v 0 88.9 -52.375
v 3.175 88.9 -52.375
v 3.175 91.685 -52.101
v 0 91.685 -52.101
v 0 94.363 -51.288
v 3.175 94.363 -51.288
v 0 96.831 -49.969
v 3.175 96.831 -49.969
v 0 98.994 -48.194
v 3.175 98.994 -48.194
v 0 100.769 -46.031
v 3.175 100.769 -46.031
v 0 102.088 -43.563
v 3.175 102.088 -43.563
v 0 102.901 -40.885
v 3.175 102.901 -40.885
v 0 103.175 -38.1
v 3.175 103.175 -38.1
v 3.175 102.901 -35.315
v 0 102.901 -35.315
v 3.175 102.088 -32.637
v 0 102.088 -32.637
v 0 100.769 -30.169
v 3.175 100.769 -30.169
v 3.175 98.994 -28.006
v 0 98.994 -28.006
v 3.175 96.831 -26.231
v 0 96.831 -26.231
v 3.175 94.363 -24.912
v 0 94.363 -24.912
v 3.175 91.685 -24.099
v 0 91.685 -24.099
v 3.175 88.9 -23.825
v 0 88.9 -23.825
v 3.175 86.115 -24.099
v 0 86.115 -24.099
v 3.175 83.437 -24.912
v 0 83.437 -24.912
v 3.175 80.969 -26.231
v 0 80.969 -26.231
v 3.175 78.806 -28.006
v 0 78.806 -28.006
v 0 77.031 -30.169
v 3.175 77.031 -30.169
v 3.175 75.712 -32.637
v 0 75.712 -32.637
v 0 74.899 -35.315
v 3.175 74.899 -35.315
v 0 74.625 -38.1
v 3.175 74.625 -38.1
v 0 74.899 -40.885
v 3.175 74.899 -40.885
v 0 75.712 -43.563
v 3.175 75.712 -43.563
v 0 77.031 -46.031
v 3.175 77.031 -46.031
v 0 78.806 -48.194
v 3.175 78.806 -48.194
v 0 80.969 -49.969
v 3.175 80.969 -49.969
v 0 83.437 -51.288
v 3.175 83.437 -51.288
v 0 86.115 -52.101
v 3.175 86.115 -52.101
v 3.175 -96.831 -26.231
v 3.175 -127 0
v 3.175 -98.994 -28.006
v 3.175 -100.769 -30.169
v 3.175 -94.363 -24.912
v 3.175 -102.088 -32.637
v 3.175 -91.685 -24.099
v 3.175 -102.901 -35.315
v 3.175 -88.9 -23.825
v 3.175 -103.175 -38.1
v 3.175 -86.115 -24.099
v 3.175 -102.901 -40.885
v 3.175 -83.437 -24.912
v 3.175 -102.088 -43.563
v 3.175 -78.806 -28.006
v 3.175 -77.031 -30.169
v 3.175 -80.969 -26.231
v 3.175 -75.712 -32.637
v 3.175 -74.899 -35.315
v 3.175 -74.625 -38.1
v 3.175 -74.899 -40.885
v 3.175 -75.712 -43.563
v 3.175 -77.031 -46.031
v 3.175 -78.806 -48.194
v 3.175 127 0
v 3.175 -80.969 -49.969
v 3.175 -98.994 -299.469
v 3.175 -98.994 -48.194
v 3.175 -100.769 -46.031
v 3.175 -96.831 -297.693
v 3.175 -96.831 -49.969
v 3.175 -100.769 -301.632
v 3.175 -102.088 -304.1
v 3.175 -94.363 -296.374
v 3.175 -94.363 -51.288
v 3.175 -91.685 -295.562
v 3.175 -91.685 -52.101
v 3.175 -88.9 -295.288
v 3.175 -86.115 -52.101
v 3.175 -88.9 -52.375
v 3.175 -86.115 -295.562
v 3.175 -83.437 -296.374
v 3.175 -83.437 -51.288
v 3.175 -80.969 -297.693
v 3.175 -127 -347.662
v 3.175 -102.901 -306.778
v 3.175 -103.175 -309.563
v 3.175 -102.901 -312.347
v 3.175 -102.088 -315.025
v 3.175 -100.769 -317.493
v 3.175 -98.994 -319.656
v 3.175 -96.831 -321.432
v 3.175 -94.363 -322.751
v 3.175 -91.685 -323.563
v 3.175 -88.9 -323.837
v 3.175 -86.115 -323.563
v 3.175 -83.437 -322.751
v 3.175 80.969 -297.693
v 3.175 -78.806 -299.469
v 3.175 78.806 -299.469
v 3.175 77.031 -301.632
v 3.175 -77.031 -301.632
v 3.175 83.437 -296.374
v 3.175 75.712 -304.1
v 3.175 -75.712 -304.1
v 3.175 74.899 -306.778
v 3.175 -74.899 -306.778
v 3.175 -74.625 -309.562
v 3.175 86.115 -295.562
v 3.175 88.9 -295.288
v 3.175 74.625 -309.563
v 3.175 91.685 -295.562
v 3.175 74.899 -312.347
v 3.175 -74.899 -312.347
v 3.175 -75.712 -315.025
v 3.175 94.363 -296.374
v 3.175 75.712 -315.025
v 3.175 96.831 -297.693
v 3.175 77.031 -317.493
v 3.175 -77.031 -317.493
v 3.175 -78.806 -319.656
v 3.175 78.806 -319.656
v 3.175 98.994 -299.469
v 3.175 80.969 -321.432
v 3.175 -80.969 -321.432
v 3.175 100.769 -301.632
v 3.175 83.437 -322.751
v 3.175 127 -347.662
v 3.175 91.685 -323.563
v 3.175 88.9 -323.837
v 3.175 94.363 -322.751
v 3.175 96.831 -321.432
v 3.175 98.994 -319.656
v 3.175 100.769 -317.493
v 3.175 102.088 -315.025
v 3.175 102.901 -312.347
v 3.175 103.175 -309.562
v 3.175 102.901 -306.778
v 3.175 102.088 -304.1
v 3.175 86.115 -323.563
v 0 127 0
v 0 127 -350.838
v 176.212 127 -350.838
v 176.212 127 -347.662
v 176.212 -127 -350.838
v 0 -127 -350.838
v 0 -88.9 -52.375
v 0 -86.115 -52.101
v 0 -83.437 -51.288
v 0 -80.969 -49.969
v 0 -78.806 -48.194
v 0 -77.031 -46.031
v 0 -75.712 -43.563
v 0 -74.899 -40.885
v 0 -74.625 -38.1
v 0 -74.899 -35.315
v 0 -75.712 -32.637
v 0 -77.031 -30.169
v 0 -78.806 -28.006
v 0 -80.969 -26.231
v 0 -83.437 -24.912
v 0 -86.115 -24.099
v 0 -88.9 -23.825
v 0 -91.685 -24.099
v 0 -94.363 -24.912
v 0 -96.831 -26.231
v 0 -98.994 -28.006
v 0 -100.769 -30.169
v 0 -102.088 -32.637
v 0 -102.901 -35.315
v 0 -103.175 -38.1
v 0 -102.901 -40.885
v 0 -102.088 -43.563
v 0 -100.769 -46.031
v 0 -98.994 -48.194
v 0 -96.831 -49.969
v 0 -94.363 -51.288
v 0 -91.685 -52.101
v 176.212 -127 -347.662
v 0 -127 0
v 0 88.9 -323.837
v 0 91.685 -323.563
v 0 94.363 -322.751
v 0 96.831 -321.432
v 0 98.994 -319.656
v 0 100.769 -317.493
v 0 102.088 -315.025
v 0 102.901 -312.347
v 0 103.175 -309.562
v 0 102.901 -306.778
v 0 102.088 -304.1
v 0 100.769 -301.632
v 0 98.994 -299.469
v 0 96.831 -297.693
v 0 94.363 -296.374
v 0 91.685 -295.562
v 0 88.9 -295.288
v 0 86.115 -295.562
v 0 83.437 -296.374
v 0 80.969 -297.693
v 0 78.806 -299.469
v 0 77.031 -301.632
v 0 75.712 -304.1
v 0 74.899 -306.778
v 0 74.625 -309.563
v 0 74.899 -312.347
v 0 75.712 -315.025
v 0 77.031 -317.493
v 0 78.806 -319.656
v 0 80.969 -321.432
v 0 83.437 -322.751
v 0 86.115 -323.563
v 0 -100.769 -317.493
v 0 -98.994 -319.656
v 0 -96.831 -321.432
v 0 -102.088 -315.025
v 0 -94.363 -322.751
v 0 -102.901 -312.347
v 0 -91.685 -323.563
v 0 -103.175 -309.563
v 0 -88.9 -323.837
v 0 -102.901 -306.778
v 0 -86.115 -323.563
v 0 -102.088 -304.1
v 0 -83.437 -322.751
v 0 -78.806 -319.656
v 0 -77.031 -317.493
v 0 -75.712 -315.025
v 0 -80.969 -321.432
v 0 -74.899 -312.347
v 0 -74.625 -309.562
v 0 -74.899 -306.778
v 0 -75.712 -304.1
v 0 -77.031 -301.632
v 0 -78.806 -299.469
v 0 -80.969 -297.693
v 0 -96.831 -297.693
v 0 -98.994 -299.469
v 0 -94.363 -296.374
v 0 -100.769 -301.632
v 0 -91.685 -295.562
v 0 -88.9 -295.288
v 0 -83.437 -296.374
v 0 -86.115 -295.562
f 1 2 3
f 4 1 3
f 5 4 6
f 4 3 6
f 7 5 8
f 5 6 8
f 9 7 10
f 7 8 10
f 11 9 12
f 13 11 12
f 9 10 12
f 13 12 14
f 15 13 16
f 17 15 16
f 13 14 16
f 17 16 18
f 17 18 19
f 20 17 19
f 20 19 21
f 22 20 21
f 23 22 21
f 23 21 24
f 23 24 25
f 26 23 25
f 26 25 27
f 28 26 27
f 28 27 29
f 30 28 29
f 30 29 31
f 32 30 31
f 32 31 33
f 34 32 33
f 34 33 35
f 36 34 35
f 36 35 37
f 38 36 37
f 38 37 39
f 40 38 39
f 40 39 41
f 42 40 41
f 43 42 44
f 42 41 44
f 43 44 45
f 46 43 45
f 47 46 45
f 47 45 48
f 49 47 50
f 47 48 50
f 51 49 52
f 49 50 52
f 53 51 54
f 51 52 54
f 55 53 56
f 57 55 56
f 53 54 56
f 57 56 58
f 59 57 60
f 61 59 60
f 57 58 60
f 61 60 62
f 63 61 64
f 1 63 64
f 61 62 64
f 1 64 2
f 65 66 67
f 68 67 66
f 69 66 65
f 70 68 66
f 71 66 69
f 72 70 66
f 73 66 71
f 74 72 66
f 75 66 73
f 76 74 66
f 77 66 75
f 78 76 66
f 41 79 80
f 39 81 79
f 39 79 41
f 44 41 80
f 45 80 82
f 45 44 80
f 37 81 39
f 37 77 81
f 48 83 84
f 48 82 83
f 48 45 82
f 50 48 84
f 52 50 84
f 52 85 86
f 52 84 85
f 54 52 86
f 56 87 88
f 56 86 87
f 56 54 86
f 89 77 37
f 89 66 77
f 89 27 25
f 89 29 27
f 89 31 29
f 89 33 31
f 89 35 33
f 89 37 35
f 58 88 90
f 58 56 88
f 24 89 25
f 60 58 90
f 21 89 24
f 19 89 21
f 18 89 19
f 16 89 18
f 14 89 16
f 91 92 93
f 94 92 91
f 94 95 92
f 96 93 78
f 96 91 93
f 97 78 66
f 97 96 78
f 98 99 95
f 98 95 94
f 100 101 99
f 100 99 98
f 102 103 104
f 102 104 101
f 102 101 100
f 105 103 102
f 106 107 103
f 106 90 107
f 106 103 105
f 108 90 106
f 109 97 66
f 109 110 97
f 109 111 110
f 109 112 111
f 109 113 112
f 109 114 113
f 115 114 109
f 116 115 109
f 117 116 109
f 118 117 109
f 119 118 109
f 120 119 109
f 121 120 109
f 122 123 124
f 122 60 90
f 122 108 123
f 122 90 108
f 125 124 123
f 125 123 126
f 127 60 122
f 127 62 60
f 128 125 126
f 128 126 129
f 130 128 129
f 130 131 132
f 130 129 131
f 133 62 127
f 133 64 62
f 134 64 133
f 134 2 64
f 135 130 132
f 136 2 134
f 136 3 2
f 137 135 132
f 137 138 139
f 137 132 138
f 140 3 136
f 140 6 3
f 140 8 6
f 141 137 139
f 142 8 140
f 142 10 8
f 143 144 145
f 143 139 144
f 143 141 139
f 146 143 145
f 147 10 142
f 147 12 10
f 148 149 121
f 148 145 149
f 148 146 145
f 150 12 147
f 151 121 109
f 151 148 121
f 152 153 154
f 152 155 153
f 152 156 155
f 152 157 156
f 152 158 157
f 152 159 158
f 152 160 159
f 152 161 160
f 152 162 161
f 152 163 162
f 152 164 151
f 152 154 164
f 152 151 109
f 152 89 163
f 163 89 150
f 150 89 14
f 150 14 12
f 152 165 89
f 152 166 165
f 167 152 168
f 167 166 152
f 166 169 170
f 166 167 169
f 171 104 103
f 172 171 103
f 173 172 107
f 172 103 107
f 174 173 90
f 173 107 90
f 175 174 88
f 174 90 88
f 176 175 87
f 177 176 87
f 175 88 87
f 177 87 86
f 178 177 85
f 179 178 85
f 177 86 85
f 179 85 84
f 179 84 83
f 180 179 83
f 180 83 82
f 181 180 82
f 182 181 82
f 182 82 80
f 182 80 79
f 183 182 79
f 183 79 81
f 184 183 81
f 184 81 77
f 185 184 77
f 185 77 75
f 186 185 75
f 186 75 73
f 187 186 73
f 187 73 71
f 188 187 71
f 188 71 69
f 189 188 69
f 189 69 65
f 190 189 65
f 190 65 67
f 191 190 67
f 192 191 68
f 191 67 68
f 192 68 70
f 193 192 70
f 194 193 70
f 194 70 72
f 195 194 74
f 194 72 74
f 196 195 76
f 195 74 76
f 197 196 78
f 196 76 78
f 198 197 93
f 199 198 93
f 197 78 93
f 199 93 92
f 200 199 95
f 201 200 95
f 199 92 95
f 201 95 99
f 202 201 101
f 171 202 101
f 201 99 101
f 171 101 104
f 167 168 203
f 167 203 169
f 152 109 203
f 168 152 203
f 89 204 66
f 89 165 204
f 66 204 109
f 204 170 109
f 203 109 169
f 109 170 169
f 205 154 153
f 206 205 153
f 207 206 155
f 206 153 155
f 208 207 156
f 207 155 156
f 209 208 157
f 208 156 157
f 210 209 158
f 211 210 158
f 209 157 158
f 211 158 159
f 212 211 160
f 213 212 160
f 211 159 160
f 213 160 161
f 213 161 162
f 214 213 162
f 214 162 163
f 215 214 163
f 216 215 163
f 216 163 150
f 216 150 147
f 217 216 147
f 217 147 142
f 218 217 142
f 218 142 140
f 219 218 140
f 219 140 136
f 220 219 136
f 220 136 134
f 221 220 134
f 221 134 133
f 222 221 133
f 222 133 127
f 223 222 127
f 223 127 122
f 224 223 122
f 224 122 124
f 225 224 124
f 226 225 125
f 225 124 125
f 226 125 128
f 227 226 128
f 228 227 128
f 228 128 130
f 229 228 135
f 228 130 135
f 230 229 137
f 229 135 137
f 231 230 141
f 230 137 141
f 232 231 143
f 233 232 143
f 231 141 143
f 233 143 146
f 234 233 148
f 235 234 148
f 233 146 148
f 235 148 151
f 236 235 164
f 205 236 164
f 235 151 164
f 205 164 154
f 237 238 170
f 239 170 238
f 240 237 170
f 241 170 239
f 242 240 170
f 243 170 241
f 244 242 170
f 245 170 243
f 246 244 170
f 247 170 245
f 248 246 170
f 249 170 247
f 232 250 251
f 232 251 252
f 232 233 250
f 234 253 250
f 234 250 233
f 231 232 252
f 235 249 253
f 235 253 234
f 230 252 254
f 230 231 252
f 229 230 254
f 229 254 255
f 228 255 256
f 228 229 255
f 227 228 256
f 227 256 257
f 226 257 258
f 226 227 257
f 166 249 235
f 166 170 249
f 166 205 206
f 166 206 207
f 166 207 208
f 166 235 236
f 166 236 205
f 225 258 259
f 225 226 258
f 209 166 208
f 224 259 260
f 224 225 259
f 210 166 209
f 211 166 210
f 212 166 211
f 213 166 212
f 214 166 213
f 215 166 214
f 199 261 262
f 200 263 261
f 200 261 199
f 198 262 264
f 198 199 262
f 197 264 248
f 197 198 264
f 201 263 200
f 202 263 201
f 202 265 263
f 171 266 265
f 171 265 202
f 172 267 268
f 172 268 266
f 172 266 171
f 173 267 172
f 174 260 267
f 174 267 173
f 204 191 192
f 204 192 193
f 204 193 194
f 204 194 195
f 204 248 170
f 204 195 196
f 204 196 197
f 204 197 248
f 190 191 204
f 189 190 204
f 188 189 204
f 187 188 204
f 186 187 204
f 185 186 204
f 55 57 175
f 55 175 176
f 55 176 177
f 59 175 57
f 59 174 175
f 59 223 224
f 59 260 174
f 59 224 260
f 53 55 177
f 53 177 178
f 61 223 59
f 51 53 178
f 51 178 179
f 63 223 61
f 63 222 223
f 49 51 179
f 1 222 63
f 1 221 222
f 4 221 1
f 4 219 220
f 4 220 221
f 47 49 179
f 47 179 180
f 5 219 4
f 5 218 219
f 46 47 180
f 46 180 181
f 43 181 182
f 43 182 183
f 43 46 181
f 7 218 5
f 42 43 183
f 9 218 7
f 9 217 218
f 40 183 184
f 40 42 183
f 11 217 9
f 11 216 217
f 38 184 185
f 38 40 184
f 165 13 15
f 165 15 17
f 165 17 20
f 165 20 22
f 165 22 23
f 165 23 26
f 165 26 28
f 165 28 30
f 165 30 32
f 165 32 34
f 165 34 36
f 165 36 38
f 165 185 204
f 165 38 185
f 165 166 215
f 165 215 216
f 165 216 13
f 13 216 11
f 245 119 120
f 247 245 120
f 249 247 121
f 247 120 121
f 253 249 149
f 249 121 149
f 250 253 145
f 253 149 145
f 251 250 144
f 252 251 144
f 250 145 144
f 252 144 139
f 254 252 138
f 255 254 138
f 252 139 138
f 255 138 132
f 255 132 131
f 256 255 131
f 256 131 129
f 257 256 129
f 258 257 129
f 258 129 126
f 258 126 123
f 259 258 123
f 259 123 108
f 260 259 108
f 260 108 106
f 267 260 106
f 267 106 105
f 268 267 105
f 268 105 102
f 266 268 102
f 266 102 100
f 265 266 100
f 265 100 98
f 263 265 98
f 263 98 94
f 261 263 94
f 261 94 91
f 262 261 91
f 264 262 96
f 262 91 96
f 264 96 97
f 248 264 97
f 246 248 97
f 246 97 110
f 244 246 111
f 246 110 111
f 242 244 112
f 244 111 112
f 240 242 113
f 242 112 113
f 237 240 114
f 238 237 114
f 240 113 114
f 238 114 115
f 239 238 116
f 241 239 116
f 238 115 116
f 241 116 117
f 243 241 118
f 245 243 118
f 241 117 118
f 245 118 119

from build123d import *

# Parameters (mm, degrees)
BOSS_EXTRUDE1_DEPTH = 127
SKETCH2_R           = 14.2748
CUT_EXTRUDE1_DEPTH  = 4.175


with BuildPart() as part:
    # Sketch1 → Boss-Extrude1 (new body, symmetric)
    with BuildSketch(Plane(origin=(0, 0, 0), x_dir=(1, 0, 0), z_dir=(0, 1, 0))):
        Polygon((0, 0), (3.175, 0), (3.175, 347.6625), (176.2125, 347.6625), (176.2125, 350.8375), (0, 350.8375), align=None)
    extrude(amount=BOSS_EXTRUDE1_DEPTH, both=True)

    # Sketch2 → Cut-Extrude1 (cut, through all)
    with BuildSketch(Plane(origin=(3.175, 0, 0), x_dir=(0, 0, -1), z_dir=(1, 0, 0))):
        with Locations((309.5625, -88.9)):
            Circle(SKETCH2_R)
        with Locations((309.5625, 88.9)):
            Circle(SKETCH2_R)
        with Locations((38.1, -88.9)):
            Circle(SKETCH2_R)
        with Locations((38.1, 88.9)):
            Circle(SKETCH2_R)
    extrude(amount=-CUT_EXTRUDE1_DEPTH, mode=Mode.SUBTRACT)


solid = part.part
